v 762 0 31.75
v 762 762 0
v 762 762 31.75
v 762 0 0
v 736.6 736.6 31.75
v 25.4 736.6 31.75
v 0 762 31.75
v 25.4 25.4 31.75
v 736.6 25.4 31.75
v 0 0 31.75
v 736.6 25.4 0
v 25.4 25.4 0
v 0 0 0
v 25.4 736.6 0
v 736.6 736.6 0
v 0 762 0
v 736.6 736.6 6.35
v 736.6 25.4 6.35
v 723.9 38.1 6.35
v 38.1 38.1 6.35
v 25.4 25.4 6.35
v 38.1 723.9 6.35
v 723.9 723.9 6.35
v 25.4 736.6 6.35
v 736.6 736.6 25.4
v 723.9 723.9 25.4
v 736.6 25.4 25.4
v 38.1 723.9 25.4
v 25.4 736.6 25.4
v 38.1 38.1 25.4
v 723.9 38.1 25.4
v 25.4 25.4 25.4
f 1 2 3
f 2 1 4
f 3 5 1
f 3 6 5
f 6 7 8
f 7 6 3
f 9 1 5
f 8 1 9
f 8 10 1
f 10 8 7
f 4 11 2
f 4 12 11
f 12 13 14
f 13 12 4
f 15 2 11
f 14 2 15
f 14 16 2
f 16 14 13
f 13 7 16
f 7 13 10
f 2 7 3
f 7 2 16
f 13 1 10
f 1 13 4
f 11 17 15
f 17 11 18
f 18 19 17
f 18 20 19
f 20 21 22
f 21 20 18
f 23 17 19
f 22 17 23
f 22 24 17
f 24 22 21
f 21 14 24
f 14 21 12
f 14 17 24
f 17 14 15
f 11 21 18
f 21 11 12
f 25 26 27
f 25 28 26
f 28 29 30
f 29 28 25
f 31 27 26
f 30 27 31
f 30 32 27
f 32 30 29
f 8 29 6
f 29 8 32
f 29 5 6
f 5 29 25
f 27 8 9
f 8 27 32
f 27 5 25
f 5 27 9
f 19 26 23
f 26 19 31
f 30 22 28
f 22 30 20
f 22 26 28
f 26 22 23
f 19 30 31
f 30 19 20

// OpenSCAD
in=25.4;
glass_x=28*in;
glass_y=28*in;
glass_z=0.25*in;

lip=0.5*in;

mirror_gap=0.75*in;
plywood_h=0.75*in;

table_x=30*in;
table_y=30*in;

table_z=glass_z*2+mirror_gap;
pad=0.1;
padd=pad*2;

module glass(pad=0) {
    translate([(table_x-glass_x)/2,(table_y-glass_y)/2,-pad])
    cube([glass_x,glass_y,glass_z+pad]);
}

module bottom_glass() {
    glass(pad);
}

module hole() {
    translate([(table_x-glass_x)/2+lip,(table_y-glass_y)/2+lip,-pad])
    cube([glass_x-lip*2,glass_y-lip*2,table_z+padd]);
}

module top_glass() {
    translate([0,0,table_z])
    mirror([0,0,1])
    glass(pad);
}

module solid() {
    difference() {
        cube([table_x,table_y,table_z]);
        bottom_glass();
        top_glass();
        hole();
    }
}

solid();
